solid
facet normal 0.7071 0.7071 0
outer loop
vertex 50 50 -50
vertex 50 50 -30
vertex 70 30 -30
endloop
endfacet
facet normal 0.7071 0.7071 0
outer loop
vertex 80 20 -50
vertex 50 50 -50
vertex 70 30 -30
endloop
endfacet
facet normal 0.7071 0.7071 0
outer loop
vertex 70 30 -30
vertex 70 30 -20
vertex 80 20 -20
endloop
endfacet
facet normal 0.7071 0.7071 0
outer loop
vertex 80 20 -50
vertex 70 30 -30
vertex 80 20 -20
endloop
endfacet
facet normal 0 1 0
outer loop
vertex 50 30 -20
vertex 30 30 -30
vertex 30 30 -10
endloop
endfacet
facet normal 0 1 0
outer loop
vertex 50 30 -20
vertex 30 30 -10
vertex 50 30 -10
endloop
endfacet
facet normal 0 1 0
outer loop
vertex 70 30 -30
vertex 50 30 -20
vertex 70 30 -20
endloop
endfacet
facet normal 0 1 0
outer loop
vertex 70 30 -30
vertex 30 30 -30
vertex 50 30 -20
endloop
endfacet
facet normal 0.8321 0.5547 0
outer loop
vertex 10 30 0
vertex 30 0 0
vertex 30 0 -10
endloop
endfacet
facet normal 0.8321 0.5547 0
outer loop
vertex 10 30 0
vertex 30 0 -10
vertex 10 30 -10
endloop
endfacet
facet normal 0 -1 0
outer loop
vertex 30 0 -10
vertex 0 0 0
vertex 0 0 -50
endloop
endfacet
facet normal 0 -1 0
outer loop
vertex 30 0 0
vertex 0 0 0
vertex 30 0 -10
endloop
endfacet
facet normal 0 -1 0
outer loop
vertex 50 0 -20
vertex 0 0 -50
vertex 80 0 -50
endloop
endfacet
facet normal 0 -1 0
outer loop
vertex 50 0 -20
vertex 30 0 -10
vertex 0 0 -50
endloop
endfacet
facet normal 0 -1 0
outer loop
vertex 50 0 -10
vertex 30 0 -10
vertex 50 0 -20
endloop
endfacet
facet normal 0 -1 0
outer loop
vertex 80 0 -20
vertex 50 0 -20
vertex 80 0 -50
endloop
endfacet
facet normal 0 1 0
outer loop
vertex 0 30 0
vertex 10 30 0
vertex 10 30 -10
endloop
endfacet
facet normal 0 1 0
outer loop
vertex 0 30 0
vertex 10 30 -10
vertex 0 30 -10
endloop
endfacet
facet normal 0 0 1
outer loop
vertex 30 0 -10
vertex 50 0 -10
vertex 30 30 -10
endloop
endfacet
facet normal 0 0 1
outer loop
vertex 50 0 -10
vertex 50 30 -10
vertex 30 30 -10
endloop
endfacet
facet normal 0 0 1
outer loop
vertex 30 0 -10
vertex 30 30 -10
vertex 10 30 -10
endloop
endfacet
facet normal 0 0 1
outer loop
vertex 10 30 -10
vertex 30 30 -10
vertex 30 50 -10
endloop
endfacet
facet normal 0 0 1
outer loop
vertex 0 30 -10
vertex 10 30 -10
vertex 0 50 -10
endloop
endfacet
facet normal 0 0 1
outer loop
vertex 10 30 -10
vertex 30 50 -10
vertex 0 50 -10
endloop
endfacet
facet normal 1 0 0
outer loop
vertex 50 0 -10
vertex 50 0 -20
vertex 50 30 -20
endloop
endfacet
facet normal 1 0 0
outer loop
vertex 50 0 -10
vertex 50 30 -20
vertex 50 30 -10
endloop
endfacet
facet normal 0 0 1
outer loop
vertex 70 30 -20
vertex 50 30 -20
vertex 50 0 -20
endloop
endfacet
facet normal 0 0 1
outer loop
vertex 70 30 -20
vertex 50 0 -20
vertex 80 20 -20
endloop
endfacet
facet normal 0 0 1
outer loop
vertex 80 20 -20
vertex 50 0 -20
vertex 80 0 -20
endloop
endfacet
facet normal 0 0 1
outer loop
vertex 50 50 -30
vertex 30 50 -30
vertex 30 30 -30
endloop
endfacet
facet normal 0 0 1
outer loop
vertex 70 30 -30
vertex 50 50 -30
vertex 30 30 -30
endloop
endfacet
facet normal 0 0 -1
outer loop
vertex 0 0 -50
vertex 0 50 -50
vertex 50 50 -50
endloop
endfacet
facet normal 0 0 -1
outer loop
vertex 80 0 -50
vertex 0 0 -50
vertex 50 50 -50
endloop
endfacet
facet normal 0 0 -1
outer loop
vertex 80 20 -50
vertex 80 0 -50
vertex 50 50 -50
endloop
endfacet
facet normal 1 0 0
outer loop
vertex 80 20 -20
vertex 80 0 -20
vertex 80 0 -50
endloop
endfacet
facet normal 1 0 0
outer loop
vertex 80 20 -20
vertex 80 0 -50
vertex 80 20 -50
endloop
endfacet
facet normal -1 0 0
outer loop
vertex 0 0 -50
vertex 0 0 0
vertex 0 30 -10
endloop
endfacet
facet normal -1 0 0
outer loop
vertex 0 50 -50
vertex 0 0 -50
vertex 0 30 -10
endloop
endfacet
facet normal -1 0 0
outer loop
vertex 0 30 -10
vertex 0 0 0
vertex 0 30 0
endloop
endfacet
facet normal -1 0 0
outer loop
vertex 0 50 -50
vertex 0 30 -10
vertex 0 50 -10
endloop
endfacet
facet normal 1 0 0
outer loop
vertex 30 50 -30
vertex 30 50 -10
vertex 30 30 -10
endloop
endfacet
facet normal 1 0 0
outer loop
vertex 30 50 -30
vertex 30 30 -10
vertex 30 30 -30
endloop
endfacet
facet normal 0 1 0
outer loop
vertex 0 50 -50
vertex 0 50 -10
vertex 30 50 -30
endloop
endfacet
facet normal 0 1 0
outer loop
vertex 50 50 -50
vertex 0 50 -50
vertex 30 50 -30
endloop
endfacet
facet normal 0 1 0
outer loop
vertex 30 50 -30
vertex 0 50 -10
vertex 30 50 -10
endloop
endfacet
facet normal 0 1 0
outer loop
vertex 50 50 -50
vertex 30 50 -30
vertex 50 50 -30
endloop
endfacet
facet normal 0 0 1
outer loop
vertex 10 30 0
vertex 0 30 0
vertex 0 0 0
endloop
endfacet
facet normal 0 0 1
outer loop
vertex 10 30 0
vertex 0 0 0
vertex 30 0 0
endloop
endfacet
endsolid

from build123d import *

# Parameters (mm, degrees)
SKETCH1_W           = 80
SKETCH1_H           = 50
BOSS_EXTRUDE1_DEPTH = 50
CUT_EXTRUDE1_DEPTH  = 10
CUT_EXTRUDE2_DEPTH  = 56
SKETCH4_W           = 30
SKETCH4_H           = 10
CUT_EXTRUDE3_DEPTH  = 56
SKETCH5_W           = 82.14120513
SKETCH5_H           = 20
CUT_EXTRUDE4_DEPTH  = 20


with BuildPart() as part:
    # Sketch1 → Boss-Extrude1 (new body)
    with BuildSketch(Plane.XY):
        with Locations((40, 25)):
            Rectangle(SKETCH1_W, SKETCH1_H)
    extrude(amount=-BOSS_EXTRUDE1_DEPTH)

    # Sketch2 → Cut-Extrude1 (cut)
    with BuildSketch(Plane.XY):
        Polygon((0, 30), (0, 50), (80, 50), (80, 0), (30, 0), (10, 30), align=None)
    extrude(amount=-CUT_EXTRUDE1_DEPTH, mode=Mode.SUBTRACT)

    # Sketch3 → Cut-Extrude2 (cut)
    with BuildSketch(Plane.XY.offset(-10)):
        Polygon((50, 50), (80, 20), (80, 50), align=None)
    extrude(amount=-CUT_EXTRUDE2_DEPTH, mode=Mode.SUBTRACT)

    # Sketch4 → Cut-Extrude3 (cut)
    with BuildSketch(Plane.XZ):
        with Locations((65, -15)):
            Rectangle(SKETCH4_W, SKETCH4_H)
    extrude(amount=-CUT_EXTRUDE3_DEPTH, mode=Mode.SUBTRACT)

    # Sketch5 → Cut-Extrude4 (cut)
    with BuildSketch(Plane(origin=(0, 50, 0), x_dir=(1, 0, 0), z_dir=(0, 1, 0))):
        with Locations((71.070602565, 20)):
            Rectangle(SKETCH5_W, SKETCH5_H)
    extrude(amount=-CUT_EXTRUDE4_DEPTH, mode=Mode.SUBTRACT)


solid = part.part
